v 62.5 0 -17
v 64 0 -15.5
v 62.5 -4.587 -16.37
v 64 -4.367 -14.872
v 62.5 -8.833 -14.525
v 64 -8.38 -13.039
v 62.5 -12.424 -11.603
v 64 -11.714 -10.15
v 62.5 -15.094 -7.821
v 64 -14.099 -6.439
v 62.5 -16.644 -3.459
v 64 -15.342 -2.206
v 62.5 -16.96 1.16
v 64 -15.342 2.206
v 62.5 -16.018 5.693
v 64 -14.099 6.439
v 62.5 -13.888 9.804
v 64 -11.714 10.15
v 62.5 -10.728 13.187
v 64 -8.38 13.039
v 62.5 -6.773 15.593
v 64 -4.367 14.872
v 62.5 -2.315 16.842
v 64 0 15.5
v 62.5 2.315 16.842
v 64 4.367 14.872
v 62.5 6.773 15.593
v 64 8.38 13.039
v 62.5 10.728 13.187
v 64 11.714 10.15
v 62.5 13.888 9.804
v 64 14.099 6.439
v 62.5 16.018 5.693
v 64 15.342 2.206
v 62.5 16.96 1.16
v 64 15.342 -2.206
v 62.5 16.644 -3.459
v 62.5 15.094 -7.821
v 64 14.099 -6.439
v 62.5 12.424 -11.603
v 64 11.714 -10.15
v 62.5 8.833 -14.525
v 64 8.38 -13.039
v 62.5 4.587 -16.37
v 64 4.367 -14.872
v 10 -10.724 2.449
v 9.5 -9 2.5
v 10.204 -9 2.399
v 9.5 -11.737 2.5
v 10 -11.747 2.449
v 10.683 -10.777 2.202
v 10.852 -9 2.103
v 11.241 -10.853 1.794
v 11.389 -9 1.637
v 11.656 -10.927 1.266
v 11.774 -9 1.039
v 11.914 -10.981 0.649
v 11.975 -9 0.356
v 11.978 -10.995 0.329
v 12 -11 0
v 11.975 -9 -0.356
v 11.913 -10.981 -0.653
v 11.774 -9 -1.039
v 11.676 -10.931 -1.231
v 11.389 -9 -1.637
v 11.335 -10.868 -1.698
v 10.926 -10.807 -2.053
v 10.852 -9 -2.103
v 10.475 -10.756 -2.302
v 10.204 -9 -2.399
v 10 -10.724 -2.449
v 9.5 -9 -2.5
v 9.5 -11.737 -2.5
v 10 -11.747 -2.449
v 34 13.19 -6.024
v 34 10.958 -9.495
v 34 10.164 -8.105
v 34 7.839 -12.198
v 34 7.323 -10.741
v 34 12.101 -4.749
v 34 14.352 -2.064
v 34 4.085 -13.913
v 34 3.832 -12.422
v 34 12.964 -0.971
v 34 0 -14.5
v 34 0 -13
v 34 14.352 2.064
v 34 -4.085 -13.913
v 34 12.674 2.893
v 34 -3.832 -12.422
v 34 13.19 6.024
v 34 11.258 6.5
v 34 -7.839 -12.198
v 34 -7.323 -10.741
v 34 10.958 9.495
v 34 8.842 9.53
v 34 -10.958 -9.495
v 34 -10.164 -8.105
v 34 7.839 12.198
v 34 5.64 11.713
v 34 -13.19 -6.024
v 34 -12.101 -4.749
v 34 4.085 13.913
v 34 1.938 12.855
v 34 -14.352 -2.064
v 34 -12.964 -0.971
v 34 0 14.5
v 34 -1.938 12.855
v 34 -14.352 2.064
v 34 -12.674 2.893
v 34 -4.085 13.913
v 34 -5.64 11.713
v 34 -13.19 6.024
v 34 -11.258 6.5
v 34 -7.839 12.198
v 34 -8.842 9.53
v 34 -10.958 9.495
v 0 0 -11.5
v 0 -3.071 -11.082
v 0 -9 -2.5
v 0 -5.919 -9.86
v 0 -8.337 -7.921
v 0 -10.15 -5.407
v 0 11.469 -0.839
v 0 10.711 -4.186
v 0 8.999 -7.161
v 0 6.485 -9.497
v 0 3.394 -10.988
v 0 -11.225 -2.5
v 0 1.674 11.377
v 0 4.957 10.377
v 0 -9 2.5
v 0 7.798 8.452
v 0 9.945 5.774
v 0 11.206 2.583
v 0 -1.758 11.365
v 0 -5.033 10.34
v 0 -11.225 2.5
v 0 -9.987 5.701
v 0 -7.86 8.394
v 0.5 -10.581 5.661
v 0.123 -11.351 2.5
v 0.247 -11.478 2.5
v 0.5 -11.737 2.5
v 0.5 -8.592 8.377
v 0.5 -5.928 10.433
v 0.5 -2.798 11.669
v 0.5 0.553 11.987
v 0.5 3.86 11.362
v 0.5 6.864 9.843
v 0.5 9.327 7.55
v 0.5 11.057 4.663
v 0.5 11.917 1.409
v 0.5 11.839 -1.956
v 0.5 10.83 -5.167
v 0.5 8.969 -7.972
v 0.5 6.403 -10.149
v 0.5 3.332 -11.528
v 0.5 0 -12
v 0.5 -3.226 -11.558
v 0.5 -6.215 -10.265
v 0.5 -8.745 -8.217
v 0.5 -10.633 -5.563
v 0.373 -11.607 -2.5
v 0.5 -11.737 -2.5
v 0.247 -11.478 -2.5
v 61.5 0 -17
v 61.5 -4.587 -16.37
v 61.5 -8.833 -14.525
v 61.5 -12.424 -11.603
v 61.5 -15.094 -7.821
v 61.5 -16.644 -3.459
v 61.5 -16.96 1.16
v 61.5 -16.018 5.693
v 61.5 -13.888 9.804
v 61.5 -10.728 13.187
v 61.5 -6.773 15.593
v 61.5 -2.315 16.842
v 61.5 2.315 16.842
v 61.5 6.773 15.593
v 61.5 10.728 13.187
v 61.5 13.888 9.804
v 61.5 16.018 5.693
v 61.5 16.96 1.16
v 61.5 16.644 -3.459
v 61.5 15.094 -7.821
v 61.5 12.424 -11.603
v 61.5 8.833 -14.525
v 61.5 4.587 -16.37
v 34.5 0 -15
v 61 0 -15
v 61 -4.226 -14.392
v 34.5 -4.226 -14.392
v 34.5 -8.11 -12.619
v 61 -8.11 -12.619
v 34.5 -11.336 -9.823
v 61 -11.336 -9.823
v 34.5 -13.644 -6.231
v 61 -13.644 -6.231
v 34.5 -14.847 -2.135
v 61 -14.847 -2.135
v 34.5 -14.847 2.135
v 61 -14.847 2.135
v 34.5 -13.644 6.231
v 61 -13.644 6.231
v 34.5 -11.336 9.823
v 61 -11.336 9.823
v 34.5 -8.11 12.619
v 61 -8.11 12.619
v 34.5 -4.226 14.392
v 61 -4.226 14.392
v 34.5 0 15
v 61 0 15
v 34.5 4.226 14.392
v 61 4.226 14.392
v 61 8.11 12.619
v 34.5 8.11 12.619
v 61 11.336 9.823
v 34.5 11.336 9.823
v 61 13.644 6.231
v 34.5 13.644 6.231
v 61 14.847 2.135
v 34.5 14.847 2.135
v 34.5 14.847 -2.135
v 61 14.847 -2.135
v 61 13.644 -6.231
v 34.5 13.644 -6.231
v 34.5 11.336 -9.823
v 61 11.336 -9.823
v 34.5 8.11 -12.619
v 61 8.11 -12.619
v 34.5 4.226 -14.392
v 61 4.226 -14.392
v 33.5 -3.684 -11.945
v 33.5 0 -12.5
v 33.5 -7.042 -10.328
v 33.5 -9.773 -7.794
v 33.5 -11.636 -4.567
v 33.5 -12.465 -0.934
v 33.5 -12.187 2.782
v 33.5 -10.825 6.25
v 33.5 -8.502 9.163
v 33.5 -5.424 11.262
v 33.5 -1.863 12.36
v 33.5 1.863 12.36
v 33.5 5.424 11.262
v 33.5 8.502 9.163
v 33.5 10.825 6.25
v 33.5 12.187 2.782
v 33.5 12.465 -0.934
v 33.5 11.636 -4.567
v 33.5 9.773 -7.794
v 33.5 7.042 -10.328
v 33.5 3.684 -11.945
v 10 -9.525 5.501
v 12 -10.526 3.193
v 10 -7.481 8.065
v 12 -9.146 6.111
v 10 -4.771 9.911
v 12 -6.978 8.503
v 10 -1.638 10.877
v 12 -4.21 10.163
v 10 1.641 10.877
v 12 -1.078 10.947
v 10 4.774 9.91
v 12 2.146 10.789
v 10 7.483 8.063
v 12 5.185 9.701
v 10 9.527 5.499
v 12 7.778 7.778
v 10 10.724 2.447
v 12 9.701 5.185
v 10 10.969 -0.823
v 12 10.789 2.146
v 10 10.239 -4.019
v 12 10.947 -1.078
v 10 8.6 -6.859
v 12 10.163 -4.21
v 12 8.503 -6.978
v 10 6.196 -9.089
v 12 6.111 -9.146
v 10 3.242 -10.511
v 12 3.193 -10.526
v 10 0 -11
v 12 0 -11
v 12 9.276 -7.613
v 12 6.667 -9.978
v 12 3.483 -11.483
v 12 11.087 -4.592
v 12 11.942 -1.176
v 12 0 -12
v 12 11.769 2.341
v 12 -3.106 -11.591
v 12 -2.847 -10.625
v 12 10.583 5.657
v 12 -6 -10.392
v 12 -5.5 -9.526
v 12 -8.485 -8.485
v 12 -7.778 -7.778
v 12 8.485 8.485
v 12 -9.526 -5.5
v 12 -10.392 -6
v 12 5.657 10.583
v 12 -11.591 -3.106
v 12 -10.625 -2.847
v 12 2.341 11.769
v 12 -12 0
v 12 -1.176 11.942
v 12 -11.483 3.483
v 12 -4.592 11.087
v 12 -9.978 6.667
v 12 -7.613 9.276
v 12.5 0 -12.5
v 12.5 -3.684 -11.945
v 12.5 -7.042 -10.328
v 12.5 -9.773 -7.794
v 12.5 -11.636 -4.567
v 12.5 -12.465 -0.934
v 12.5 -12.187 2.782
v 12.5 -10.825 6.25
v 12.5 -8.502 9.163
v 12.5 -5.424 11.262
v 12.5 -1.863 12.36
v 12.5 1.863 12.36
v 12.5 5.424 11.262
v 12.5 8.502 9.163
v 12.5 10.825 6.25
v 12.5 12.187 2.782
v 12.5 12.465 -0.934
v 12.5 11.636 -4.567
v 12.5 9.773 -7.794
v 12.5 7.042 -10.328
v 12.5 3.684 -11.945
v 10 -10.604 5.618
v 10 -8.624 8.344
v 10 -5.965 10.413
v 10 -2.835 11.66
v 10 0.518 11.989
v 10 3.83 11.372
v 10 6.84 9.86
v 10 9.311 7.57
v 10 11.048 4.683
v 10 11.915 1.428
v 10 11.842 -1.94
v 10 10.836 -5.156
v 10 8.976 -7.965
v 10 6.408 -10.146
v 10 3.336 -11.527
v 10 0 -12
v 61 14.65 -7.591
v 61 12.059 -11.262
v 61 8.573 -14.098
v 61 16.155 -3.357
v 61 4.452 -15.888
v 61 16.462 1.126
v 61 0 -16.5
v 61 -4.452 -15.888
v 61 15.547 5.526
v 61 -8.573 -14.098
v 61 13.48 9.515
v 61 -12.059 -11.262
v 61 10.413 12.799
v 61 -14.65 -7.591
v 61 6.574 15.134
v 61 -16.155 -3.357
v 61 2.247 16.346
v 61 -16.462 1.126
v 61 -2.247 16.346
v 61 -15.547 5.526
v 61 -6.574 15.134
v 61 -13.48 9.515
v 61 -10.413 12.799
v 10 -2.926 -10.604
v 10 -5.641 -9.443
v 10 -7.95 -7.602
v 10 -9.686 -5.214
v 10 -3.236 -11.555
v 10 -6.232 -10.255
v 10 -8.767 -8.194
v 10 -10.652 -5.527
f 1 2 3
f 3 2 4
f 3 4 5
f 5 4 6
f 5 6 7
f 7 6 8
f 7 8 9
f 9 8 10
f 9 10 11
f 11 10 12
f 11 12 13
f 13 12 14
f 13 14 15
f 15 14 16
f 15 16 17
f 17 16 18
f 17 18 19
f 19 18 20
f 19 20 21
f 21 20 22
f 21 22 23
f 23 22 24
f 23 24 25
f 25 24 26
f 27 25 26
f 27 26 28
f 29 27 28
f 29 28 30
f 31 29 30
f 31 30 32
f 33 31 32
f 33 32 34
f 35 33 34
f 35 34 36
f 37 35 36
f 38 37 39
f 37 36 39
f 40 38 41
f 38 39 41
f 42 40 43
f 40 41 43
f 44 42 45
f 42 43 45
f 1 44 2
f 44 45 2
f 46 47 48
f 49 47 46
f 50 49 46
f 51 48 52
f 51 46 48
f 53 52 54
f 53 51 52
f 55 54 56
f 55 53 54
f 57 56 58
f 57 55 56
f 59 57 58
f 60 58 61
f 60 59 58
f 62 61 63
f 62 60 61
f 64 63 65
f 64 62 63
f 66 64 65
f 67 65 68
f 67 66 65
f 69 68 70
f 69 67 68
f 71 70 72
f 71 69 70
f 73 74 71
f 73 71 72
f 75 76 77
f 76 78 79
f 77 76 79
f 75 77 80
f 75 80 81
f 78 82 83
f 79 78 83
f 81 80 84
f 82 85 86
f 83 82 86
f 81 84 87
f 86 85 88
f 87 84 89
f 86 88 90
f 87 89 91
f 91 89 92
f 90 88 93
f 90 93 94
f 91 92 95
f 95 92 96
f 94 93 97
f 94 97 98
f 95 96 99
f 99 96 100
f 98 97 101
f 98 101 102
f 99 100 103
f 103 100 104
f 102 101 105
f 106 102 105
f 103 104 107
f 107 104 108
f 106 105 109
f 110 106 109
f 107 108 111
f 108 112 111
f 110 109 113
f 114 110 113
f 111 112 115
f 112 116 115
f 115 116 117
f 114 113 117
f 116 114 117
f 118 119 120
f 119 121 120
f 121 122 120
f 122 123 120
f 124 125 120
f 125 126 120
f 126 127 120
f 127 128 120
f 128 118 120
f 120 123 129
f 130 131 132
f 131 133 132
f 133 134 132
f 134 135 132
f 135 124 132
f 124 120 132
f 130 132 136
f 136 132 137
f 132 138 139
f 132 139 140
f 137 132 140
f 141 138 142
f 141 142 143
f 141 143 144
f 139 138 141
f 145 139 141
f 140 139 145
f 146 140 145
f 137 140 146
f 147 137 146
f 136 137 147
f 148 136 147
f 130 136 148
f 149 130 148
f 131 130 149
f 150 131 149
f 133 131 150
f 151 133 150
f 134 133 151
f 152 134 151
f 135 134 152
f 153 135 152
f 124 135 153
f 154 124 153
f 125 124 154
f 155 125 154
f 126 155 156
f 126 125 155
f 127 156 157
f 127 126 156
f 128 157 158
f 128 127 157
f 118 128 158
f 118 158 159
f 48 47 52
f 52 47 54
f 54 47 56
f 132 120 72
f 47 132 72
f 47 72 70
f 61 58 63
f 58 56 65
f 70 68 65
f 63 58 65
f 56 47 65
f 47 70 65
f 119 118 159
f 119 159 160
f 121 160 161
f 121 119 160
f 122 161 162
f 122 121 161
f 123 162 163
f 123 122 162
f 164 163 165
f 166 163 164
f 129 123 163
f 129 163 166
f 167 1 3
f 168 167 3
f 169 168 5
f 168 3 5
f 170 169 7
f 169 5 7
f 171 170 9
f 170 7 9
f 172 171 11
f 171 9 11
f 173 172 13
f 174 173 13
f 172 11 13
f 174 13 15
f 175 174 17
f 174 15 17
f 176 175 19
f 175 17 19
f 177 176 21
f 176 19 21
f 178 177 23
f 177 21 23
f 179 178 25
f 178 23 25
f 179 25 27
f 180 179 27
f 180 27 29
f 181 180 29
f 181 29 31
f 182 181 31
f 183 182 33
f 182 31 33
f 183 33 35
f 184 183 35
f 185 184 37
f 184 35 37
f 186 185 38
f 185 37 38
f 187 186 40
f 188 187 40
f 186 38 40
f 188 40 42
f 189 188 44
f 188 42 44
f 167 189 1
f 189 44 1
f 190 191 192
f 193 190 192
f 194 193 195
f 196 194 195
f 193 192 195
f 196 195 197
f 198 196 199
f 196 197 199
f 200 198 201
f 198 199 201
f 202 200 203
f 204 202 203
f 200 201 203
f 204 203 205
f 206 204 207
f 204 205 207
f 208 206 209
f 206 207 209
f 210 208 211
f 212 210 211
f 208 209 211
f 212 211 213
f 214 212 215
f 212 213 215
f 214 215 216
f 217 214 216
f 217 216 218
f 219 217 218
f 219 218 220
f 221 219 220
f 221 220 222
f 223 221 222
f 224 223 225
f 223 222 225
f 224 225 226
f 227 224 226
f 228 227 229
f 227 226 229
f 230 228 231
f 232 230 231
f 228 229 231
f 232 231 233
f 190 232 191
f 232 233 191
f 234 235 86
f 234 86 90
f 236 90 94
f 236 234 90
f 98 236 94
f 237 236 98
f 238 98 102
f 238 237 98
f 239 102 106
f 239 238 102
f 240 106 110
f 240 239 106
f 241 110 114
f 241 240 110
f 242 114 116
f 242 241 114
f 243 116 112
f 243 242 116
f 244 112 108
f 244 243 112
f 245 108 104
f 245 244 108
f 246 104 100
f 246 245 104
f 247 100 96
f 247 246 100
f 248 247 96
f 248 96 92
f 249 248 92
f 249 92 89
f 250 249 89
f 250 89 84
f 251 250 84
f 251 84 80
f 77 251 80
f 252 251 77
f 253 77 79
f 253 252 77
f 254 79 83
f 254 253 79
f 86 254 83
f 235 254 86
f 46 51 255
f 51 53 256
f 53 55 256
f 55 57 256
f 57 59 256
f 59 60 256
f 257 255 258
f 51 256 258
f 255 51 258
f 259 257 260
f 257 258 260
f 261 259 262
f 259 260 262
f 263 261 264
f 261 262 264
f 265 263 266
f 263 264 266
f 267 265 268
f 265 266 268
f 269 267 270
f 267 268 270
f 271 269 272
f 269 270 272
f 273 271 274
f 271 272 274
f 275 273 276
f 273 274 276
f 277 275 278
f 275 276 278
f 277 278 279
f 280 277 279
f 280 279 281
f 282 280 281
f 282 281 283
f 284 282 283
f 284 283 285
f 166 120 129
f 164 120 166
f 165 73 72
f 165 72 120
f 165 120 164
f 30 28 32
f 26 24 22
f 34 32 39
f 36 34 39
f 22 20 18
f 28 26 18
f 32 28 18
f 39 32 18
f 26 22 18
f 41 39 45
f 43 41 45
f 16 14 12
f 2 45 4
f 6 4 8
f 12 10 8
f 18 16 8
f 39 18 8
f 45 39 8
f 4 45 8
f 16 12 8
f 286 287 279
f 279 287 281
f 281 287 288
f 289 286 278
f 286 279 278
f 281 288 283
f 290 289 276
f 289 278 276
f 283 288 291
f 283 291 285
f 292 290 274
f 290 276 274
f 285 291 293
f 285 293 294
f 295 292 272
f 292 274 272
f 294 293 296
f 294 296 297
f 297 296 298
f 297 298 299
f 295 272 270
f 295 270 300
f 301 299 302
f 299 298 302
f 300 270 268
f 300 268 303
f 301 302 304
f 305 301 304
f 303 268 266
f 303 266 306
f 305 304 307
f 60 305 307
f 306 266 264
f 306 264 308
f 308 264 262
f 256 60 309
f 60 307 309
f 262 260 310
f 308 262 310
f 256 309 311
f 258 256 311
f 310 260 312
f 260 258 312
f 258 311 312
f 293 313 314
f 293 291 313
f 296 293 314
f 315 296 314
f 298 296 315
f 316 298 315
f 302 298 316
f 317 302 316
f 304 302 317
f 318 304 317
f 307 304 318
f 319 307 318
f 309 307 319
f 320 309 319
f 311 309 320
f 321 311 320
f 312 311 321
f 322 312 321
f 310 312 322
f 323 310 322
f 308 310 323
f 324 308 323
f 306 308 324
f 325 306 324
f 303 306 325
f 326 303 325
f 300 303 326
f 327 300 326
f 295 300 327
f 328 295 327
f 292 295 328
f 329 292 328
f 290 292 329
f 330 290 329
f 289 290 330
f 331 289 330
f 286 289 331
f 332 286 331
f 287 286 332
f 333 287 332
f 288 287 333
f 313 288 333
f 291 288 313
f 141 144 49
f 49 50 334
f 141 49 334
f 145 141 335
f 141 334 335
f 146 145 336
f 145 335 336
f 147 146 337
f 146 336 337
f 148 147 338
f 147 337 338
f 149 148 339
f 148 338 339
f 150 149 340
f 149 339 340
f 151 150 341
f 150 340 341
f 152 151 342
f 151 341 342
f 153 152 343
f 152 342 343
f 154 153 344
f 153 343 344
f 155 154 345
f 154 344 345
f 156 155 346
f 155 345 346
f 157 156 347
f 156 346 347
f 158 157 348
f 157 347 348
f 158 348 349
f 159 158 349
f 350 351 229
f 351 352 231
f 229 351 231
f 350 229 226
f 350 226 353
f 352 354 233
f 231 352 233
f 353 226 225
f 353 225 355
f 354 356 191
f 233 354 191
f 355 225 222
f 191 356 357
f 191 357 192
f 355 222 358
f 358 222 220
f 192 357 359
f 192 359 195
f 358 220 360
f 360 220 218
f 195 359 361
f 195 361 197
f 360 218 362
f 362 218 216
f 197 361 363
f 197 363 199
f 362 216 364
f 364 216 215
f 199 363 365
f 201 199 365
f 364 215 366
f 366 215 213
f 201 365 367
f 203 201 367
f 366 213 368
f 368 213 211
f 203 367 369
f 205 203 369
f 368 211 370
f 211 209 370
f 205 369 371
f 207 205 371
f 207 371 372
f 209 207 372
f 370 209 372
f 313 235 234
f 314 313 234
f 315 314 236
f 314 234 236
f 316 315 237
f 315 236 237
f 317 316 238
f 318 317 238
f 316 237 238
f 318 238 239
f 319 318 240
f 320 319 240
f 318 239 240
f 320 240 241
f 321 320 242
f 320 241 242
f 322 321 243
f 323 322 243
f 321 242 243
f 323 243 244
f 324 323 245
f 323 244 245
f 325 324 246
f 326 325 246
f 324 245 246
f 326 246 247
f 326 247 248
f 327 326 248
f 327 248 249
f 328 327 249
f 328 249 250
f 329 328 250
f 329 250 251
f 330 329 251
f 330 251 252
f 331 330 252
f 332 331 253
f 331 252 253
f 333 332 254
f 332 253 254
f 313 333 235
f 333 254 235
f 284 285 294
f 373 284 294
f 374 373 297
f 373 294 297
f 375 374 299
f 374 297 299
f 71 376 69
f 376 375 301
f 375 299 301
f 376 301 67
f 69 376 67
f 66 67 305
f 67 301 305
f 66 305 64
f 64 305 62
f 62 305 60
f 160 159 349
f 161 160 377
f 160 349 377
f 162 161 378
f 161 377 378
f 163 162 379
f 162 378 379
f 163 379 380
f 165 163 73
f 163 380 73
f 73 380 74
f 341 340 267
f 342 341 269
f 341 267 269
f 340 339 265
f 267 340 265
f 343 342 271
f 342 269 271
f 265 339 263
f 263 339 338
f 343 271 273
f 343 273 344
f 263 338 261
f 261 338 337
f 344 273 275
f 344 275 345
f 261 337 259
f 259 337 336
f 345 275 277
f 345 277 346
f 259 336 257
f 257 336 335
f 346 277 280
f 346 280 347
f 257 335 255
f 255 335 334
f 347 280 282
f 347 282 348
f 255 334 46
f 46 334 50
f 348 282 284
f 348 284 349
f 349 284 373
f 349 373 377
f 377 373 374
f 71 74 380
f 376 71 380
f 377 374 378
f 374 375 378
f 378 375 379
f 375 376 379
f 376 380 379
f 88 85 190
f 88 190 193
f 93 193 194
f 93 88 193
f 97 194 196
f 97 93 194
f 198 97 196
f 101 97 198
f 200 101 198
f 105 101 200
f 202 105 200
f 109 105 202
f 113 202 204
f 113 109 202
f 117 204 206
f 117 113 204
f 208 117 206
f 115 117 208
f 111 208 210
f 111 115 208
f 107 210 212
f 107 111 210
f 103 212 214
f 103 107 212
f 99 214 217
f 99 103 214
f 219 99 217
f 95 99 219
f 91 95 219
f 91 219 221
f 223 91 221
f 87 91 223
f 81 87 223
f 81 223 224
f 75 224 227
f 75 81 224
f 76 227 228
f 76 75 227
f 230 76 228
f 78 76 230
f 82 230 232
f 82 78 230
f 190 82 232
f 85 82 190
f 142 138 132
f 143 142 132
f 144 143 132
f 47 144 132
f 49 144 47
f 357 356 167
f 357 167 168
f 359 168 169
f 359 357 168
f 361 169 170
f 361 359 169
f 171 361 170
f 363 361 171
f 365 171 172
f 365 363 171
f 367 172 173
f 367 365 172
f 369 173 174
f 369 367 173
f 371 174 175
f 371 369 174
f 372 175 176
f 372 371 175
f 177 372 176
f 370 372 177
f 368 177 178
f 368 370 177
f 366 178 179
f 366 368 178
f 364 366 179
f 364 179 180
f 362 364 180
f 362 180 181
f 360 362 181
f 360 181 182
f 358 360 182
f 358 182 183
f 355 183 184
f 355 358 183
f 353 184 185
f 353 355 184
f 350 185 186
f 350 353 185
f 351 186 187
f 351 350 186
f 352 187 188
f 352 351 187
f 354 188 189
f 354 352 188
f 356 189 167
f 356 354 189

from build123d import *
from build123d.topology import SkipClean

# Parameters (mm, degrees)
CHAMFER_1_SIZE      = 1.5
CHAMFER_2_SIZE      = 0.5
CUT_EXTRUDE_START   = -3
CUT_EXTRUDE_1_DEPTH = 3


# Read off the part's stored shape, not the designer's step: 切除-拉伸1
with BuildPart() as part:
    # 草图1 → 旋转1 (revolve)
    with BuildSketch(Plane.XY, mode=Mode.PRIVATE) as revolve_1_sk:
        Polygon((0, 0), (0, 12), (10, 12), (10, 11), (12, 11), (12, 12.5), (34, 12.5), (34, 15), (61, 15), (61, 17), (64, 17), (64, 0), align=None)
    revolve(revolve_1_sk.sketch.rotate(Axis((0, 0, 0), (-1, 0, 0)), 90), axis=Axis((0, 0, 0), (-1, 0, 0)))

    # 倒角1
    chamfer_1_edges = [part.edges().sort_by_distance(p)[0] for p in [
        (64, 0, 17),
    ]]
    chamfer(chamfer_1_edges, length=CHAMFER_1_SIZE)

    # 倒角2
    chamfer_2_edges = [part.edges().sort_by_distance(p)[0] for p in [
        (61, 0, 17),
        (34, 0, 15),
        (34, 0, 12.5),
        (12, 0, 12.5),
        (0, 0, 12),
    ]]
    chamfer(chamfer_2_edges, length=CHAMFER_2_SIZE)

    # 切除-拉伸1 outline → 切除-拉伸1 (cut)
    with SkipClean():  # the faces are left unmerged after this step: merging them gives an invalid solid
        with BuildSketch(Plane(origin=(0, -9, 0), x_dir=(1, 0, 0), z_dir=(0, 1, 0)).offset(CUT_EXTRUDE_START)):
            with BuildLine():
                Line((9.5, 2.5), (0, 2.5))
                Line((0, 2.5), (0, -2.5))
                Line((0, -2.5), (9.5, -2.5))
                ThreePointArc((9.5, -2.5), (12, 0), (9.5, 2.5))
            make_face()
        extrude(amount=CUT_EXTRUDE_1_DEPTH, mode=Mode.SUBTRACT)


solid = part.part
